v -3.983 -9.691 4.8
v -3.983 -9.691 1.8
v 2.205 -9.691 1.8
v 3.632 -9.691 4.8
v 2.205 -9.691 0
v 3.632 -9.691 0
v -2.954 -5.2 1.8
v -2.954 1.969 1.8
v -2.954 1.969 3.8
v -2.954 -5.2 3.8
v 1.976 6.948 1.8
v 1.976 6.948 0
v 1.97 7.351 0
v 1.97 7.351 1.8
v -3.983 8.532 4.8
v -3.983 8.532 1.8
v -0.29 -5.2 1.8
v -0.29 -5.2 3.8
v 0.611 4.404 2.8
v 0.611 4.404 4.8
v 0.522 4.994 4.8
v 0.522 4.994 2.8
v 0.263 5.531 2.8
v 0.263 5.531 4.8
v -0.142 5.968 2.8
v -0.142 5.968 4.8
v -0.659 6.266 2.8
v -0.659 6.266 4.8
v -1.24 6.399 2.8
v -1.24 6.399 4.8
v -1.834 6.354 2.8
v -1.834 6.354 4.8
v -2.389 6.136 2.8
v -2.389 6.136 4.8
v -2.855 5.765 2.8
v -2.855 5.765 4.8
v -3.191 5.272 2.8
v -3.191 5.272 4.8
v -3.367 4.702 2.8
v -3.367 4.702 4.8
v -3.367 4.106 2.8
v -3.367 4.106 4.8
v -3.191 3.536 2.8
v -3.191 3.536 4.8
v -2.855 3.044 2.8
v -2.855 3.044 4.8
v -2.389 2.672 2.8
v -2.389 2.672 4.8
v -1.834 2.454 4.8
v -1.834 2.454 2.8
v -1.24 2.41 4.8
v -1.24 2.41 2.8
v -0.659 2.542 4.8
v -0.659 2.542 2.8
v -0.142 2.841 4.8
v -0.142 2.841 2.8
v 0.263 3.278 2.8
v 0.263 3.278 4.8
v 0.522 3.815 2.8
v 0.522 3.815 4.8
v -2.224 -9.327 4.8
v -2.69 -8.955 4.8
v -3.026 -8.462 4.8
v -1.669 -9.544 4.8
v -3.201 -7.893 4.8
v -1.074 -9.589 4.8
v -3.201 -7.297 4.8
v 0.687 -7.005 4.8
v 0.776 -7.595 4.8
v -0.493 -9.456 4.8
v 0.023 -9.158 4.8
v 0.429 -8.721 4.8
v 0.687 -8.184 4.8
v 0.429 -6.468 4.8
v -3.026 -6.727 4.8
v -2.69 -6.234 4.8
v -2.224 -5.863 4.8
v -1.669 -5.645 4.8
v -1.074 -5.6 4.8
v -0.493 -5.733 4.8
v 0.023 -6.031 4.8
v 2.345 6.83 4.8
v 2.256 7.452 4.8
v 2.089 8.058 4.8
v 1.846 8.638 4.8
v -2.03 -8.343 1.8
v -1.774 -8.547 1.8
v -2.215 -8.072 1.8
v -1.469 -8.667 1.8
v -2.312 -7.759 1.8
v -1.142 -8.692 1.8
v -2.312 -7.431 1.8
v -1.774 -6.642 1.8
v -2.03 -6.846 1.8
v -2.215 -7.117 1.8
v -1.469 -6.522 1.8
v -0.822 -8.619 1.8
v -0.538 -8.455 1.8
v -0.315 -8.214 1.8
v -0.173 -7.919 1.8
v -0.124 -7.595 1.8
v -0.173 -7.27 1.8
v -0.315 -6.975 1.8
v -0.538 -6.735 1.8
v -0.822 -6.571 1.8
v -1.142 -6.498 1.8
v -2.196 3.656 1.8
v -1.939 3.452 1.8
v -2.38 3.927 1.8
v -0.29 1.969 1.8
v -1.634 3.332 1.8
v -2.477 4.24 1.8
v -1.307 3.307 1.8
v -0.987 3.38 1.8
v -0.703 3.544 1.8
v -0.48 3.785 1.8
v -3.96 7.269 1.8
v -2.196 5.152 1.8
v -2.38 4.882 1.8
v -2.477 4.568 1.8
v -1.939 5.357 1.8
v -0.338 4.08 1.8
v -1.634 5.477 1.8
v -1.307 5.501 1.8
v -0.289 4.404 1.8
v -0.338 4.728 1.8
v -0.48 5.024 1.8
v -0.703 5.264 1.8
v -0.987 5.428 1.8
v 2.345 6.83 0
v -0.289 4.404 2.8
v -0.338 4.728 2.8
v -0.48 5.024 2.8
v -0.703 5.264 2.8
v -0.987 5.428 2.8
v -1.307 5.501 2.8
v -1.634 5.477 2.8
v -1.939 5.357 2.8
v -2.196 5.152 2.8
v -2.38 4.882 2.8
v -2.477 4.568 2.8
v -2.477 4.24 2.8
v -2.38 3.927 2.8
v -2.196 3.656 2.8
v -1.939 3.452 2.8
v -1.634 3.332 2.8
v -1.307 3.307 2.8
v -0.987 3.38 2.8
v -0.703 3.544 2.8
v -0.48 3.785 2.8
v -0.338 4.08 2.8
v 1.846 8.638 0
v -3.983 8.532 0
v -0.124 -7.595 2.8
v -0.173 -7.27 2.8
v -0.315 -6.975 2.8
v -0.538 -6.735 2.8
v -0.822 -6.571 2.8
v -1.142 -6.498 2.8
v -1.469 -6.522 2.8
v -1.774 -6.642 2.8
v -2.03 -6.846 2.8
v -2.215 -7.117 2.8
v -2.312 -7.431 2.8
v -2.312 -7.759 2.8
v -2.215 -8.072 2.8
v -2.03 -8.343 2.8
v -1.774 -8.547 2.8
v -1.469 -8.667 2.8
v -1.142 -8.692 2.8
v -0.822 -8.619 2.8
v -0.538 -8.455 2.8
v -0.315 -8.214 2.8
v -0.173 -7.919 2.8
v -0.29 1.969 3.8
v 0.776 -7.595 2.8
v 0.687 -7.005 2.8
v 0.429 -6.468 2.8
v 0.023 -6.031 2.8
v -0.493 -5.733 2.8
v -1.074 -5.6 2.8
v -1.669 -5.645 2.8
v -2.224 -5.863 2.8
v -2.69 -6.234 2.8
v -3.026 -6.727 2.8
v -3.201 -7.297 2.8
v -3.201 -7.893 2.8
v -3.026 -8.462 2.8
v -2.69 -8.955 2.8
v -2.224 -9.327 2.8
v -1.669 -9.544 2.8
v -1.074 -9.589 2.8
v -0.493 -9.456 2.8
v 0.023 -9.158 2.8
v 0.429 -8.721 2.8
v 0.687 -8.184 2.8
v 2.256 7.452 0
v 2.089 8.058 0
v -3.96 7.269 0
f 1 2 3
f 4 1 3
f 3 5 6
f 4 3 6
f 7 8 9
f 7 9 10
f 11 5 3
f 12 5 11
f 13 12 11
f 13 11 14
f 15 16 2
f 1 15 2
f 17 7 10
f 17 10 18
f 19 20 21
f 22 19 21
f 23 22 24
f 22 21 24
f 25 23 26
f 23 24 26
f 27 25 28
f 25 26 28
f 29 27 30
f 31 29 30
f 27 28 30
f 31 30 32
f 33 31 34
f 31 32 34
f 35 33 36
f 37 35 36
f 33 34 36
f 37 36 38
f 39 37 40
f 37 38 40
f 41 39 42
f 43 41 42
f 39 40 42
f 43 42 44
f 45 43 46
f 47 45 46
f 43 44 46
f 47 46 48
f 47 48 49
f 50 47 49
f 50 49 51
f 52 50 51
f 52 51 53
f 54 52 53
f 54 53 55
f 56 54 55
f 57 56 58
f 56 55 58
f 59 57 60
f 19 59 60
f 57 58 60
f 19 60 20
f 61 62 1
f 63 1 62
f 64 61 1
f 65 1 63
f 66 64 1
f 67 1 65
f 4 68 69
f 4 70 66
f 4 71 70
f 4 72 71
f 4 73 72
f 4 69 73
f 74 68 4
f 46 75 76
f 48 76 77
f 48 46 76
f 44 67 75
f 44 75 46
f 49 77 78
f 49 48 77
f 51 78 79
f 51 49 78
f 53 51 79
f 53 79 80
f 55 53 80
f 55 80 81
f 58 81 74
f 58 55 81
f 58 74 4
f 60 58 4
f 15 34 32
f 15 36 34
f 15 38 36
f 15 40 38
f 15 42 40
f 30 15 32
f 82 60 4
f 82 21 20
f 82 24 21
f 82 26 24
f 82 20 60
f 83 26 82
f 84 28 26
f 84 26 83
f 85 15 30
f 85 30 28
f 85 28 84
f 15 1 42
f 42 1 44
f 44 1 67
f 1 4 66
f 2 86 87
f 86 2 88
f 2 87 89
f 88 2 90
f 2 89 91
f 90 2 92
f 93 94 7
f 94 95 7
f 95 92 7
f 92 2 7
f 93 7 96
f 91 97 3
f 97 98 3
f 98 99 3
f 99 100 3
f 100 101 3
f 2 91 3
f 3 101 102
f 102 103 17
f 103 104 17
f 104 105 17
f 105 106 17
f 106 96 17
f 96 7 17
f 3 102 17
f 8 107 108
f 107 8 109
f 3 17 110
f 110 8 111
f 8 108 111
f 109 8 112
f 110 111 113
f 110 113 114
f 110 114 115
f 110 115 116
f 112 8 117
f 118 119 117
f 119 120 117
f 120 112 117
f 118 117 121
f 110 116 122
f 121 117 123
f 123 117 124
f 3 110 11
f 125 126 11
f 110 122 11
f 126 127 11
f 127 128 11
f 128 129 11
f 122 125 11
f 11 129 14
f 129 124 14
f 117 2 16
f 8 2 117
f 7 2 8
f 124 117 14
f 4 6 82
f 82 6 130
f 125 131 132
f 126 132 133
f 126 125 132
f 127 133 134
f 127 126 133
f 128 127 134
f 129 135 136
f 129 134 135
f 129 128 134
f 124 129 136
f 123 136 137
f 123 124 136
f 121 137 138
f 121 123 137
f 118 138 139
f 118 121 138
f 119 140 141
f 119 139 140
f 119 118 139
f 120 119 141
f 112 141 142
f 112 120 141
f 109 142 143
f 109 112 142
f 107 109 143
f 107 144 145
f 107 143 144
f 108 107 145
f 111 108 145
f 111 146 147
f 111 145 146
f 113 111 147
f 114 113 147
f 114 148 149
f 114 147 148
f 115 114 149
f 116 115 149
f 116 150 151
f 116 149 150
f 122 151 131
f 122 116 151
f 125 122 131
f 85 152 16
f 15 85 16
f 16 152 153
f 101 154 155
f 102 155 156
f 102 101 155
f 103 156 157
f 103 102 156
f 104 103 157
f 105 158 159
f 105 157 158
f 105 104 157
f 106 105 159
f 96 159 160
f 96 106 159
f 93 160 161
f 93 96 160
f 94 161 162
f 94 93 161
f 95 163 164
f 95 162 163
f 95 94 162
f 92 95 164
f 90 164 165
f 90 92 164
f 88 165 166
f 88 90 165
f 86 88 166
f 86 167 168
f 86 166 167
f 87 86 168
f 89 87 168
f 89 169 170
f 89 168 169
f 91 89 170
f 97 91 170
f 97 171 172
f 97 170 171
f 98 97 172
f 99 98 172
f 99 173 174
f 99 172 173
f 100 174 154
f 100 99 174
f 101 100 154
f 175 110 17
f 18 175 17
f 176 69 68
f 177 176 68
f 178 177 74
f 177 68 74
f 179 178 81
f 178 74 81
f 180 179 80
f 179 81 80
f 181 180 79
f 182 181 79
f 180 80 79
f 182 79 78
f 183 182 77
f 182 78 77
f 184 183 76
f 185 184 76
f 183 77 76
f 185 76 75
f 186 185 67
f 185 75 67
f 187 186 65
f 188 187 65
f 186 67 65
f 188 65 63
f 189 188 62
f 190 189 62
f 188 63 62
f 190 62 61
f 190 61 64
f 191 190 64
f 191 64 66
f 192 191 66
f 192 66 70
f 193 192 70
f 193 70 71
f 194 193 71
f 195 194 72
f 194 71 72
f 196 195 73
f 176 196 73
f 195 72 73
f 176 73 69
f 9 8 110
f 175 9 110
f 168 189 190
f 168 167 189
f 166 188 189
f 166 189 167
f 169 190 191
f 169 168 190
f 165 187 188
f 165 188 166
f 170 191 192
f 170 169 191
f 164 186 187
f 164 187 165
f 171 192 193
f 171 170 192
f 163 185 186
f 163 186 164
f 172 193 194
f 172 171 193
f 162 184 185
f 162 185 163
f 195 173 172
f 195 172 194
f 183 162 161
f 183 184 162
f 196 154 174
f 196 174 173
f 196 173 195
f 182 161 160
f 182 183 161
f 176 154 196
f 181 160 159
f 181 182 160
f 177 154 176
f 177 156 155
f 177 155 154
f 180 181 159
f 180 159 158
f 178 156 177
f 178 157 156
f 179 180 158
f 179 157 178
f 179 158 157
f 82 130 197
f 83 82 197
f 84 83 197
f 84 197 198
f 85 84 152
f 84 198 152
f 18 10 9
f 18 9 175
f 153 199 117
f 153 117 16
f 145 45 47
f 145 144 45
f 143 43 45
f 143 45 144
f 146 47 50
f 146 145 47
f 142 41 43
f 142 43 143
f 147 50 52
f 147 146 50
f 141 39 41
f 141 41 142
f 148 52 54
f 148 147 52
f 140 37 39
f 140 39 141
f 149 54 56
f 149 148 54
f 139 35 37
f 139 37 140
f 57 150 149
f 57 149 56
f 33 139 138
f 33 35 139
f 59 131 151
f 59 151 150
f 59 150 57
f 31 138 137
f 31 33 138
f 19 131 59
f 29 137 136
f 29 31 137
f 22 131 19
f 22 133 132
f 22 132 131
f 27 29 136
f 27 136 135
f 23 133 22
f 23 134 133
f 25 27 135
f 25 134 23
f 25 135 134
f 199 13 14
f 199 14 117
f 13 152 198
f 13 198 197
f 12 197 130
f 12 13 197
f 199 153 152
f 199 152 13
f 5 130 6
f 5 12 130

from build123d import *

# Parameters (mm, degrees)
BOSS_EXTRUDE1_DEPTH = 1.8
SKETCH3_R           = 1.1
BOSS_EXTRUDE2_DEPTH = 3
SKETCH4_W           = 2.663520563
SKETCH4_H           = 7.169309516
CUT_EXTRUDE1_DEPTH  = 2
SKETCH5_R           = 2
CUT_EXTRUDE2_DEPTH  = 2


with BuildPart() as part:
    # Sketch1 → Boss-Extrude1 (new body)
    with BuildSketch(Plane(origin=(0, 0, 0), x_dir=(0, 1, 0), z_dir=(0, 0, 1))):
        with BuildLine():
            Line((6.830014349, -2.344806069), (-9.690684049, -3.631823148))
            Line((-9.690684049, -3.631823148), (-9.690684049, -2.205416312))
            Line((-9.690684049, -2.205416312), (6.947514193, -1.975901922))
            Line((6.947514193, -1.975901922), (7.350857331, -1.970338035))
            Line((7.350857331, -1.970338035), (7.269057374, 3.9595904))
            Line((7.269057374, 3.9595904), (8.531793523, 3.982646507))
            Line((8.531793523, 3.982646507), (8.638213972, -1.845785322))
            ThreePointArc((8.638213972, -1.845785322), (7.758081535, -2.182141378), (6.830014349, -2.344806069))
        make_face()
    extrude(amount=BOSS_EXTRUDE1_DEPTH)

    # Sketch3 → Boss-Extrude2 (add)
    with BuildSketch(Plane.XY.offset(1.8)):
        with BuildLine():
            Line((-3.982646507, 8.531793523), (-3.982646507, -9.690684049))
            Line((-3.982646507, -9.690684049), (3.631823148, -9.690684049))
            Line((3.631823148, -9.690684049), (2.344806069, 6.830014349))
            ThreePointArc((2.344806069, 6.830014349), (2.182141378, 7.758081535), (1.845785322, 8.638213972))
            Line((1.845785322, 8.638213972), (-3.982646507, 8.531793523))
        make_face()
        with Locations((-1.223821134, -7.594621825)):
            Circle(SKETCH3_R, mode=Mode.SUBTRACT)
        with Locations((-1.389338495, 4.404236621)):
            Circle(SKETCH3_R, mode=Mode.SUBTRACT)
    extrude(amount=BOSS_EXTRUDE2_DEPTH)

    # Sketch4 → Cut-Extrude1 (cut)
    with BuildSketch(Plane(origin=(0, 0, 1.8), x_dir=(1, 0, 0), z_dir=(0, 0, -1))):
        with Locations((-1.621806935, 1.615257833)):
            Rectangle(SKETCH4_W, SKETCH4_H)
    extrude(amount=-CUT_EXTRUDE1_DEPTH, mode=Mode.SUBTRACT)

    # Sketch5 → Cut-Extrude2 (cut)
    with BuildSketch(Plane.XY.offset(4.8)):
        with Locations((-1.389338495, 4.404236621)):
            Circle(SKETCH5_R)
        with Locations((-1.223821134, -7.594621825)):
            Circle(SKETCH5_R)
    extrude(amount=-CUT_EXTRUDE2_DEPTH, mode=Mode.SUBTRACT)


solid = part.part
